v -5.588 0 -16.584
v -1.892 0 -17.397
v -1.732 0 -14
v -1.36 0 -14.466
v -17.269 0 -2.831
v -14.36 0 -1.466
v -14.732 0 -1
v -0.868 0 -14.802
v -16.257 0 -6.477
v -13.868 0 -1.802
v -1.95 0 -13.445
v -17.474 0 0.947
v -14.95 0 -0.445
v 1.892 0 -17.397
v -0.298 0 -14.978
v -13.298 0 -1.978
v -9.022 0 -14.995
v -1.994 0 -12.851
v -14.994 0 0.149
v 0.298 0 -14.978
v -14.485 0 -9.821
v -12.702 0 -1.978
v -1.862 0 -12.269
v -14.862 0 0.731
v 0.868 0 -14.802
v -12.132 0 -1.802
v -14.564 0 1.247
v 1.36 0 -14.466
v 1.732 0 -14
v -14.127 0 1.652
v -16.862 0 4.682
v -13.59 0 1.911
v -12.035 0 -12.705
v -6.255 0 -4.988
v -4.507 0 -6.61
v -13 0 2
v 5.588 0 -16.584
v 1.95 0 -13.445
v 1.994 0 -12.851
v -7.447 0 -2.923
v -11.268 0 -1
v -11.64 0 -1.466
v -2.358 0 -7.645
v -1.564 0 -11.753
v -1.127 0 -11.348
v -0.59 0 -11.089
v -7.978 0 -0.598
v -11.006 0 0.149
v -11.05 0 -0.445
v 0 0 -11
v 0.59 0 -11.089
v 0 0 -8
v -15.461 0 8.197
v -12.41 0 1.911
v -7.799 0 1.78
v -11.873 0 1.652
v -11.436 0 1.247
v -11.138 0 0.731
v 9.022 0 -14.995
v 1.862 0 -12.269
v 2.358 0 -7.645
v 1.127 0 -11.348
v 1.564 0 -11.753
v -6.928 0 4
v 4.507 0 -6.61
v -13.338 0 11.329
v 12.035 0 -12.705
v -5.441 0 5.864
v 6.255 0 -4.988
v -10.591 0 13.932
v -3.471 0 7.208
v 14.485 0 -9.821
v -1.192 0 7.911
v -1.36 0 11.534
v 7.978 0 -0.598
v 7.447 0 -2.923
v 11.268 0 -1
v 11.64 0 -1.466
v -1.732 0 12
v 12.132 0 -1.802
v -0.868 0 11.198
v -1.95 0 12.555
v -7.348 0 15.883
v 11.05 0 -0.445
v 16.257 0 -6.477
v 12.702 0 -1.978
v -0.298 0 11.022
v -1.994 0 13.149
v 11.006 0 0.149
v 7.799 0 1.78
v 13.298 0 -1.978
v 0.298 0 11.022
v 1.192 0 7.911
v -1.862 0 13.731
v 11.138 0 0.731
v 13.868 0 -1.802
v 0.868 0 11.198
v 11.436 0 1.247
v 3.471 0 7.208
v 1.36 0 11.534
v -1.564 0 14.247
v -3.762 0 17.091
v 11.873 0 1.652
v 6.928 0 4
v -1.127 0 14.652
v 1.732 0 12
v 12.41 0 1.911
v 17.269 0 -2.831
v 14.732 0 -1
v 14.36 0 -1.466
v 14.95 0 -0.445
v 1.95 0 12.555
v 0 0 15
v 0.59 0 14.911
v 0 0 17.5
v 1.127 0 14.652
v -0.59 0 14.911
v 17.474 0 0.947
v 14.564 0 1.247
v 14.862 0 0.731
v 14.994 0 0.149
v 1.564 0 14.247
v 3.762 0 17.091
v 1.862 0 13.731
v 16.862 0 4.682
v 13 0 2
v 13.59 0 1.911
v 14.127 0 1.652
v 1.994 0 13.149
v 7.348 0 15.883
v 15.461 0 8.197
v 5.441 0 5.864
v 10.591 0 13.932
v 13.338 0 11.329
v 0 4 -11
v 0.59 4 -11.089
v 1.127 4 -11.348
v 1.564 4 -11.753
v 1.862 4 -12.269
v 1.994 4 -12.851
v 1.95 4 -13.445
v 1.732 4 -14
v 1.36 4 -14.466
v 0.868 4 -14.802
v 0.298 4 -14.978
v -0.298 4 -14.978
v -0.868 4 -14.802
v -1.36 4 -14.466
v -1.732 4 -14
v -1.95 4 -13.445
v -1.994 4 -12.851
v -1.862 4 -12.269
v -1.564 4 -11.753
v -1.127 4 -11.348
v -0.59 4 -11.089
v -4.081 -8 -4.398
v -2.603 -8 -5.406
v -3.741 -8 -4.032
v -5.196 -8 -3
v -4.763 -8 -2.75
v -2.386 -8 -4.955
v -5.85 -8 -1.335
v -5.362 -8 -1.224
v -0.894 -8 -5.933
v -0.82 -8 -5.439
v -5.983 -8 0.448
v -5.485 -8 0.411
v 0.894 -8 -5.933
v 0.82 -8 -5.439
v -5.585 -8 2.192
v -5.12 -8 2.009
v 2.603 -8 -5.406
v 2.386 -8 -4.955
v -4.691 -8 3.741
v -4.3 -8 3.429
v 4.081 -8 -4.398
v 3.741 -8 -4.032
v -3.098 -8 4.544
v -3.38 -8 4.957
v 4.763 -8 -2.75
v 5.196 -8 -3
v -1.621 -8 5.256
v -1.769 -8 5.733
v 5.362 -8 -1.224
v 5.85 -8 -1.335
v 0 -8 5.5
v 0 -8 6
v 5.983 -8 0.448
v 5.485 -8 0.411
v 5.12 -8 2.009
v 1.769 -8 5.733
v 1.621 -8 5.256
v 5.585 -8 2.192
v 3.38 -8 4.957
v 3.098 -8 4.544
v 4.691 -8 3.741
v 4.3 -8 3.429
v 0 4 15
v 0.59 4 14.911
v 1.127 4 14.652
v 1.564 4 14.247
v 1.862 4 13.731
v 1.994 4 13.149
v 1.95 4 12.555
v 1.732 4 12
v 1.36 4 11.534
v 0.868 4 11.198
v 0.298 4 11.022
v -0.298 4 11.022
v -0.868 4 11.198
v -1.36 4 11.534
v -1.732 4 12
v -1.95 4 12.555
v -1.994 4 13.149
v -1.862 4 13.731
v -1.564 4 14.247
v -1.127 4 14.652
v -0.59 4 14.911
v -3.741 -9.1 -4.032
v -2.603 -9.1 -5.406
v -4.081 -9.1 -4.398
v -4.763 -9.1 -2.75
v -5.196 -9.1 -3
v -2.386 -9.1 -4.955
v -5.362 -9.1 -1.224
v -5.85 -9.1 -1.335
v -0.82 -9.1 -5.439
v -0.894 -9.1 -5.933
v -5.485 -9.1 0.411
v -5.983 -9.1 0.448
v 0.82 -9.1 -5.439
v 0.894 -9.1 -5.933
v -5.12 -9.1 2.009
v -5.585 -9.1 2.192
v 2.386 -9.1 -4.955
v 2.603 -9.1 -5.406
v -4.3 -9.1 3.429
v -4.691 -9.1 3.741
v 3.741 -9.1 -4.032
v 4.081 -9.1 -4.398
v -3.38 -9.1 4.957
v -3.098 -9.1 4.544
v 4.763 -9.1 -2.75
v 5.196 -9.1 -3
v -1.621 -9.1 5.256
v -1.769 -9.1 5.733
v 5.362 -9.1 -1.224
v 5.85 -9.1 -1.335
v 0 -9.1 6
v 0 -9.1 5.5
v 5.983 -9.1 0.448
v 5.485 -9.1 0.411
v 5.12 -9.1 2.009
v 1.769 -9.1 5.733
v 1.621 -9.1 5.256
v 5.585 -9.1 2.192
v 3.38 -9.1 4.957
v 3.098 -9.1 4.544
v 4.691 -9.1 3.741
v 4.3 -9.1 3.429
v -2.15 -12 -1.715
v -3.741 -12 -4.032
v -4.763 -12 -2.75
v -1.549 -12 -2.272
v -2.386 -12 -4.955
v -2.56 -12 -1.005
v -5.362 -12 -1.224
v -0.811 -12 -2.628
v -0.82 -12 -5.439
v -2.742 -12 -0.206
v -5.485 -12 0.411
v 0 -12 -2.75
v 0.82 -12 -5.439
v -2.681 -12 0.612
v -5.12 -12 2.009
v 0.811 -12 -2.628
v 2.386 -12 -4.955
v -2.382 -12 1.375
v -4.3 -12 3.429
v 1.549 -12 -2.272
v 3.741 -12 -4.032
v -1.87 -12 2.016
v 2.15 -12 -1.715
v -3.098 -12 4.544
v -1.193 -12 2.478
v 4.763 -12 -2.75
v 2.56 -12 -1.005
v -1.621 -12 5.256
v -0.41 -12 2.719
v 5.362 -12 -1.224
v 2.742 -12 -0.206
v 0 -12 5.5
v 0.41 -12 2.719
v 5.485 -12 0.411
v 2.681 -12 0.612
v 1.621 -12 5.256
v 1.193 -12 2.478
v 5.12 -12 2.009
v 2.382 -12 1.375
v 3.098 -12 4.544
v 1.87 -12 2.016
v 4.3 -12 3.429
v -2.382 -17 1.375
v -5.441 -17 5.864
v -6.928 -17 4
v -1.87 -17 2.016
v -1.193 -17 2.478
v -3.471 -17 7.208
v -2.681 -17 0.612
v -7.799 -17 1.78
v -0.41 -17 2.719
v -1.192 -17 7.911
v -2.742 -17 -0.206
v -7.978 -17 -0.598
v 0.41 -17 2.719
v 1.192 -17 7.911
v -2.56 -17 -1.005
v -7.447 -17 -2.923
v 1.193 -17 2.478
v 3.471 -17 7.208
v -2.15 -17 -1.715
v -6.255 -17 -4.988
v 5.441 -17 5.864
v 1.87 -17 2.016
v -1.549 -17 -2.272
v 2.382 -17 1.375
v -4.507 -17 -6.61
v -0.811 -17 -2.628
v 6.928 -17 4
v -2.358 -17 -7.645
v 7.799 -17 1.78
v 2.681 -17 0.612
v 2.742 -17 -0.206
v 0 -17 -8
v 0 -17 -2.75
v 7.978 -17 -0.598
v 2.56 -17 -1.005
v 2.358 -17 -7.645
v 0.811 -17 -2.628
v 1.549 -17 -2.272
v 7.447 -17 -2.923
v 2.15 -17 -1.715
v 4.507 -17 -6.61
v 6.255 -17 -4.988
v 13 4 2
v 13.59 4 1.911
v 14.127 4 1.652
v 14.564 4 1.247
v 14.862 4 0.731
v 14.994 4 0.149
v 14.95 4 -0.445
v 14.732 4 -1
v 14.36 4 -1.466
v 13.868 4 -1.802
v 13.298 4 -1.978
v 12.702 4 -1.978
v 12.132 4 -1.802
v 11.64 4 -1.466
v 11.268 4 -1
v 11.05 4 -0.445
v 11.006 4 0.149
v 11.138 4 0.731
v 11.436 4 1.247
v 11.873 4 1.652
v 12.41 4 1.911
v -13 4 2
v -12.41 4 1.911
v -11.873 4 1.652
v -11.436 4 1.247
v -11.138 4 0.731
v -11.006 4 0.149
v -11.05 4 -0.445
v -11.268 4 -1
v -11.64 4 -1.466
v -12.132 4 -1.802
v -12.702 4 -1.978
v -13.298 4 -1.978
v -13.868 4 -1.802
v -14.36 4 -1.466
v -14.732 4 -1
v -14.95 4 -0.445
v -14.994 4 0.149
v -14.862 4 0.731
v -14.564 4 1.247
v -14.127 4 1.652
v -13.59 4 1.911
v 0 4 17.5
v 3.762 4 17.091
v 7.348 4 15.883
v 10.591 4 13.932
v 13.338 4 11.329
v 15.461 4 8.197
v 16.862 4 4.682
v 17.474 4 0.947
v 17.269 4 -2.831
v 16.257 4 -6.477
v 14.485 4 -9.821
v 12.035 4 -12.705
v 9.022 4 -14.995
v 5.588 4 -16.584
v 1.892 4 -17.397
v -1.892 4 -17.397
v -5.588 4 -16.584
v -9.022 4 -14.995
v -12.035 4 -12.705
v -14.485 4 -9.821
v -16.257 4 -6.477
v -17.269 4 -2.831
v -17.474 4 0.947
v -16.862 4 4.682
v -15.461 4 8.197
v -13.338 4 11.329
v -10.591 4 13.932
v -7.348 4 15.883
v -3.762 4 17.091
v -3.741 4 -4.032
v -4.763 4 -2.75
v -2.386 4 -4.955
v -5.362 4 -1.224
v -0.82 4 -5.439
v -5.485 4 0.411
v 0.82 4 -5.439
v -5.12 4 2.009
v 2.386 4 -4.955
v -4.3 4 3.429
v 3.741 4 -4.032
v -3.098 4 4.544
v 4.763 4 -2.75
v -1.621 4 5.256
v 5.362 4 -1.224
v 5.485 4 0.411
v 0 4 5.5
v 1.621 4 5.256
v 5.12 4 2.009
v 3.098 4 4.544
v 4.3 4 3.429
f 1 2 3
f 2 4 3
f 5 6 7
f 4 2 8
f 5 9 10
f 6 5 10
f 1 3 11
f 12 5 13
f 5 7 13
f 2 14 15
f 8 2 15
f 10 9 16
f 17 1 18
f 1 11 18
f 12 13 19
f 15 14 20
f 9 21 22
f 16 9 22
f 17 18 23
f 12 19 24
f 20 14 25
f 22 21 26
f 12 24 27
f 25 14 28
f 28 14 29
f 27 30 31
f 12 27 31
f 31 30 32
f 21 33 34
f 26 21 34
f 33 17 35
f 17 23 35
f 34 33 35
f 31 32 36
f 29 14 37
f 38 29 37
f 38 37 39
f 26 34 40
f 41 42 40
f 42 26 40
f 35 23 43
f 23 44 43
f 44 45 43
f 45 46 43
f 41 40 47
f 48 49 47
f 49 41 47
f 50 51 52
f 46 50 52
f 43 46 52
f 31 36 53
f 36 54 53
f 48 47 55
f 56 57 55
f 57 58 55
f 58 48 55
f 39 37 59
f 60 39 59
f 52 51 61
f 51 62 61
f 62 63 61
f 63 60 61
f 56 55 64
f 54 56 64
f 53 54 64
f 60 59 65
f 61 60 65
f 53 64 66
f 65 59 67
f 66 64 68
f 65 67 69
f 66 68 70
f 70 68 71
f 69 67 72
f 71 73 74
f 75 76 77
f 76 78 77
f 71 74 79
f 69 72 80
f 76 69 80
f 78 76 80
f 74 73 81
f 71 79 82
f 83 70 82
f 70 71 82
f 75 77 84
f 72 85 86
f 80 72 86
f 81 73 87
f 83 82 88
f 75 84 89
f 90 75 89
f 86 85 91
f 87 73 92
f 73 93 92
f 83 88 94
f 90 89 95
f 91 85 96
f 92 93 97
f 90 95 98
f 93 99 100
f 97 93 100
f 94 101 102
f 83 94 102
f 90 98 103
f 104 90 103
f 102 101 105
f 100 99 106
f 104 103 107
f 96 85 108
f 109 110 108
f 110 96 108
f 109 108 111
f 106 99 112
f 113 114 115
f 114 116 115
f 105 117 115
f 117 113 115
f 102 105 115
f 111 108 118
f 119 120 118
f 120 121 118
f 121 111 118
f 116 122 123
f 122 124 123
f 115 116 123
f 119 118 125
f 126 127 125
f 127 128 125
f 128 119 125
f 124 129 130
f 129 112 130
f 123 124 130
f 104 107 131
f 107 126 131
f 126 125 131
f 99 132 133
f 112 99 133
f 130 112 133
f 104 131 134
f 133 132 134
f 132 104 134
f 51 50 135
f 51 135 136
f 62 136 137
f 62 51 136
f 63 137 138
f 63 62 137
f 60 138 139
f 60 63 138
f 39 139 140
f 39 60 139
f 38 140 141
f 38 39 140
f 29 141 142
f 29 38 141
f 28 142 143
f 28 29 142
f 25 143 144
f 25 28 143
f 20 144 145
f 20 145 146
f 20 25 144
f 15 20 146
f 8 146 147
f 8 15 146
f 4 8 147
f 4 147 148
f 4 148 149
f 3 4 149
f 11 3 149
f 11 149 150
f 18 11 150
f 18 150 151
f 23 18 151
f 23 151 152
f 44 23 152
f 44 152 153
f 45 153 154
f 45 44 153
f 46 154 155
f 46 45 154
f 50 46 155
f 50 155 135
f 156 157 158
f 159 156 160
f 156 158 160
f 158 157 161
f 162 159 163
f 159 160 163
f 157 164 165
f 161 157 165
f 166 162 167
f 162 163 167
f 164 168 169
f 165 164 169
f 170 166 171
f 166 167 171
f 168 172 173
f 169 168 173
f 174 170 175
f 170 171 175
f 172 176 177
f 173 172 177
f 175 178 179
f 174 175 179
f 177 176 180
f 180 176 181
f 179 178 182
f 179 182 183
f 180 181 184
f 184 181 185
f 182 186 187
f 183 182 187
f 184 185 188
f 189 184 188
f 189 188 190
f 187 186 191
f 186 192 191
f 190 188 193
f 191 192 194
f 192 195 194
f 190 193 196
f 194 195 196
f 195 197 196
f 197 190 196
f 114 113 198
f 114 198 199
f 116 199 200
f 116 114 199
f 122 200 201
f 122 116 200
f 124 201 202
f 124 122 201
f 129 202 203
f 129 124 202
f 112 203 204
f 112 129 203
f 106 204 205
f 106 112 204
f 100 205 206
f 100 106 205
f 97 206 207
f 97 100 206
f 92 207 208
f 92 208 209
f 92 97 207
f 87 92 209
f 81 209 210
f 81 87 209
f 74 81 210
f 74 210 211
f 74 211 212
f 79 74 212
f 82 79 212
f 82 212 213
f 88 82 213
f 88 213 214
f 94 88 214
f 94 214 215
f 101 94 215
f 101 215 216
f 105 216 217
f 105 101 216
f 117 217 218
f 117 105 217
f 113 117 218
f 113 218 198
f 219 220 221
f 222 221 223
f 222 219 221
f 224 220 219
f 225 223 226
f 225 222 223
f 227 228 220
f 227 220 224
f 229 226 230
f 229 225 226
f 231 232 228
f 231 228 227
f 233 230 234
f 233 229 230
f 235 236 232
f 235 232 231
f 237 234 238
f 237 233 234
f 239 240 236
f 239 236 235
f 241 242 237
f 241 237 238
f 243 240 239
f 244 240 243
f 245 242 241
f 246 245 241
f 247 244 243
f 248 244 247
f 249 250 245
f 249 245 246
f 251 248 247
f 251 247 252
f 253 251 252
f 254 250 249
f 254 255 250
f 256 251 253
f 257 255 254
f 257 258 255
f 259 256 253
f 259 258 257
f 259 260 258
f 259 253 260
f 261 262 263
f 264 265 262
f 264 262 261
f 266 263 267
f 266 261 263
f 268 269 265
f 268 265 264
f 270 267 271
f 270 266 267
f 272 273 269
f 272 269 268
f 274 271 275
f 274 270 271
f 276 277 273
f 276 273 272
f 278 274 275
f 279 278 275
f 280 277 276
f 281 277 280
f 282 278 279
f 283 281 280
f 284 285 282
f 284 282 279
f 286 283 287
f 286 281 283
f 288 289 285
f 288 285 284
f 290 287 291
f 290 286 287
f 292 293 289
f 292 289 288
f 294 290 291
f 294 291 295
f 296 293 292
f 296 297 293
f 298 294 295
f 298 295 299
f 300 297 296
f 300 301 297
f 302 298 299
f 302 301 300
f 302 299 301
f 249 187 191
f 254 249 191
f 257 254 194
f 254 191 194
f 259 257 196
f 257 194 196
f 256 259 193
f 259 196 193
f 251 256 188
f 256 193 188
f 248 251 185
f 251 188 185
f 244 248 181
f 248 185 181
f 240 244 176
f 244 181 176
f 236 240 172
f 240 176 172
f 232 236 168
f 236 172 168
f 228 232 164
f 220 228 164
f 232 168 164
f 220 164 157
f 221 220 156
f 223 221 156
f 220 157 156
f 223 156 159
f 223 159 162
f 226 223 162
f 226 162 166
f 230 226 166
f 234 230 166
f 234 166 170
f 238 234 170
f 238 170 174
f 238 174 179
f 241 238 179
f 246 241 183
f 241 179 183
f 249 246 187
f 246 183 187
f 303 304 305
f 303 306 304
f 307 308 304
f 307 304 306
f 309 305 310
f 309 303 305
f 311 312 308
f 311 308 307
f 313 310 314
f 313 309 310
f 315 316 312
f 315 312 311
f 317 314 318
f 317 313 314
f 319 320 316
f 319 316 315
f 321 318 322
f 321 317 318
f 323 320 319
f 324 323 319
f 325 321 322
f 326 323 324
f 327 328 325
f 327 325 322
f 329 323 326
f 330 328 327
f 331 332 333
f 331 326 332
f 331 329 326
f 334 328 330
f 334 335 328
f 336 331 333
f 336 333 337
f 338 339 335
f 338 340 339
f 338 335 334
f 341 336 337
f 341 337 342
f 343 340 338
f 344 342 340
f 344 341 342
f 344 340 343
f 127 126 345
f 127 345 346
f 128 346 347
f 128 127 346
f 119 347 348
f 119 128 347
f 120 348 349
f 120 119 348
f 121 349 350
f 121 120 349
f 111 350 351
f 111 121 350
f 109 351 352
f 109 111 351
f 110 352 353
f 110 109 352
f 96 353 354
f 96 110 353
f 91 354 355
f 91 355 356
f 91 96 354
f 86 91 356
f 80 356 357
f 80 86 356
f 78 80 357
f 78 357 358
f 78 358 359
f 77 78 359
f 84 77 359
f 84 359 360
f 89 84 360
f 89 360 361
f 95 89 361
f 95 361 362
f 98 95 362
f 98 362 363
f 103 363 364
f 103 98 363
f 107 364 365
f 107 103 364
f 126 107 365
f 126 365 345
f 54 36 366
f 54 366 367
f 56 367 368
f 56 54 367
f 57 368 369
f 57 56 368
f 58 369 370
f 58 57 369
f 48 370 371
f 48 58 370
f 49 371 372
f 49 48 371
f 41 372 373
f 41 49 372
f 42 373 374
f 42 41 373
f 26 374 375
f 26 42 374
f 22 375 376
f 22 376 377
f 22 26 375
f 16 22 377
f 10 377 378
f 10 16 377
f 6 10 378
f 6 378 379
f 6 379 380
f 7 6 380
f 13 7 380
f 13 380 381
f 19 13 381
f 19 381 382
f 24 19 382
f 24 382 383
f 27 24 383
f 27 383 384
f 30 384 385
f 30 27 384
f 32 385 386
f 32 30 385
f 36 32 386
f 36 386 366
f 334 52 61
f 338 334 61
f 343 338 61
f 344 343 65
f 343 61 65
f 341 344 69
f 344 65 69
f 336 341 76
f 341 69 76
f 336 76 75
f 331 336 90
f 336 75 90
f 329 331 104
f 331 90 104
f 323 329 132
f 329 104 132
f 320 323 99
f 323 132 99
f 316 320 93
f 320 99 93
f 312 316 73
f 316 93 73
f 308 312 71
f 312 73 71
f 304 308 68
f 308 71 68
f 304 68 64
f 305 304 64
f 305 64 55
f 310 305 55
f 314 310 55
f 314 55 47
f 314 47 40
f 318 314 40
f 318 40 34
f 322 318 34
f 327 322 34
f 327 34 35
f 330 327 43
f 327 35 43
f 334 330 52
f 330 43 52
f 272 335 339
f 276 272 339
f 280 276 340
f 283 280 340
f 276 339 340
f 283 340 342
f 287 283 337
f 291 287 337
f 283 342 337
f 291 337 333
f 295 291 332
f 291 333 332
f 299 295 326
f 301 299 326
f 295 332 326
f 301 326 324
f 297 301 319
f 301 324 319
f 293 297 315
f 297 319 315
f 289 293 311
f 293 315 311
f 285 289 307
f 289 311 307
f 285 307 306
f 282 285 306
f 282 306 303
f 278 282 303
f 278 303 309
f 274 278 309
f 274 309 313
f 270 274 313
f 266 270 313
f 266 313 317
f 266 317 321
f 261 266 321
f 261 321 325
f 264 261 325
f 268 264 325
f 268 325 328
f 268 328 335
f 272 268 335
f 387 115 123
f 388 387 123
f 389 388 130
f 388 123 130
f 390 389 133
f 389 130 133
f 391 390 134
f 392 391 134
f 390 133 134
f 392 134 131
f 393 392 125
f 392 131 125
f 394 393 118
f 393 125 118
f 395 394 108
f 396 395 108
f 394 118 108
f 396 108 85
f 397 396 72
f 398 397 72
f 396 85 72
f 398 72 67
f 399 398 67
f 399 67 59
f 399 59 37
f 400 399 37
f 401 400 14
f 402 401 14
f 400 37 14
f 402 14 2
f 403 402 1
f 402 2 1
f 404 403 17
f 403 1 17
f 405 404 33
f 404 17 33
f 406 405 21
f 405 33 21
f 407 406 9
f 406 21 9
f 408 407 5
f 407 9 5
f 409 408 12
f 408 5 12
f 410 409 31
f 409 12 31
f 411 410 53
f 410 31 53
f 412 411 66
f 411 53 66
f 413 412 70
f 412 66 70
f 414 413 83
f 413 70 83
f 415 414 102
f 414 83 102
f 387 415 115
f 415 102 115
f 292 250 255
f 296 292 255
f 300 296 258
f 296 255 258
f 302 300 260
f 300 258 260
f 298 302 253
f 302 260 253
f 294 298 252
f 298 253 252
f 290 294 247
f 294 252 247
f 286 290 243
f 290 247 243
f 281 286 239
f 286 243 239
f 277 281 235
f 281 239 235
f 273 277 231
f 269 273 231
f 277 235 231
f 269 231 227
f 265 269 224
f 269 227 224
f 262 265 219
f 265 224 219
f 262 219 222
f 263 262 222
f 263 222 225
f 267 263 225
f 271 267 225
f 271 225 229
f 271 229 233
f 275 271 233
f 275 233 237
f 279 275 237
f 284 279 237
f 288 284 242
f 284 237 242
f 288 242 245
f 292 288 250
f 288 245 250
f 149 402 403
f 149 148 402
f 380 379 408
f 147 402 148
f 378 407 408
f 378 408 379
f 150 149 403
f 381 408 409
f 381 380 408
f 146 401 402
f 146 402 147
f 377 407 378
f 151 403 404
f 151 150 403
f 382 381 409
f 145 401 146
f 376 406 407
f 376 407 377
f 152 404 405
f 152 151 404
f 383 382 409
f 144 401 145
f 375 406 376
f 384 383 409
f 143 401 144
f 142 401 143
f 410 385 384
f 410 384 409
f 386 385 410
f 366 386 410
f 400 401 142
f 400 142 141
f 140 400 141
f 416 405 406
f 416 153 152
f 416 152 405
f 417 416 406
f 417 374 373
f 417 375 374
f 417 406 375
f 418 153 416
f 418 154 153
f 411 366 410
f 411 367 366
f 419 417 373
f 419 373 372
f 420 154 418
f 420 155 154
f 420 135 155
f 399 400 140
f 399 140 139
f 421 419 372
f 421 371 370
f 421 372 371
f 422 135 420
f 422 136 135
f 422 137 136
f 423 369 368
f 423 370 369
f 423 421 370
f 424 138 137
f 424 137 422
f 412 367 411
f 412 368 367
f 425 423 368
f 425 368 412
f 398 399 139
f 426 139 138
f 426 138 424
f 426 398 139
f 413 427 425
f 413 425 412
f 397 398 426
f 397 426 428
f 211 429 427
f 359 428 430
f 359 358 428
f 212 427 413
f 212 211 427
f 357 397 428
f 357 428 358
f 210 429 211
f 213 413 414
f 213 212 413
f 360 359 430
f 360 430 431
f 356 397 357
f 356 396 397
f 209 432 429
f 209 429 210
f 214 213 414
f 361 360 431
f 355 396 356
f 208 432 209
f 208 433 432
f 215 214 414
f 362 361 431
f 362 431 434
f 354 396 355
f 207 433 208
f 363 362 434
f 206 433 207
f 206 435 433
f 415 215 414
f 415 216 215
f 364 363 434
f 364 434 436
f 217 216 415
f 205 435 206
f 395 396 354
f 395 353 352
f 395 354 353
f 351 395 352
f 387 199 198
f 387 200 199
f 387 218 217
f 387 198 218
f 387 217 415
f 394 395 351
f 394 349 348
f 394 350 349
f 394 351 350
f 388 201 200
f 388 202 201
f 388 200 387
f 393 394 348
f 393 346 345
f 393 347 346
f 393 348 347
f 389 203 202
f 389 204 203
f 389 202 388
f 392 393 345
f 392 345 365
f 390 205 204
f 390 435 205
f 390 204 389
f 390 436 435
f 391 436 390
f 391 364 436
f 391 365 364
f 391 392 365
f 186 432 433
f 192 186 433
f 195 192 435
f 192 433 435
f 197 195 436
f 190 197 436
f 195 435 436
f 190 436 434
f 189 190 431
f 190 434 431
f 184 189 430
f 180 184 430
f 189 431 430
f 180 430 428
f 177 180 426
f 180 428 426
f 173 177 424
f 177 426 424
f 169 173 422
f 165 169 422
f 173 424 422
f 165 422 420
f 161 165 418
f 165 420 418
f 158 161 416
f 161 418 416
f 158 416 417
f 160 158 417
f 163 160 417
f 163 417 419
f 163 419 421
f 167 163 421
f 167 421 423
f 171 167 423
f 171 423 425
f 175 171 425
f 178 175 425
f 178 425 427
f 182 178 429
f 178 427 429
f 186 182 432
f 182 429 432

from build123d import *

# Parameters (mm, degrees)
SKETCH1_R           = 17.5
SKETCH1_R_2         = 2
BOSS_EXTRUDE1_DEPTH = 4
SKETCH2_R           = 8
BOSS_EXTRUDE2_DEPTH = 17
SKETCH3_R           = 5.5
CUT_EXTRUDE1_DEPTH  = 12
SKETCH4_R           = 6
CUT_EXTRUDE2_DEPTH  = 1.1
SKETCH5_R           = 5.5
CUT_EXTRUDE3_DEPTH  = 2.9
SKETCH6_R           = 2.75
CUT_EXTRUDE4_DEPTH  = 5.5


with BuildPart() as part:
    # Sketch1 → Boss-Extrude1 (new body)
    with BuildSketch(Plane(origin=(0, 0, 0), x_dir=(1, 0, 0), z_dir=(0, 1, 0))):
        with Locations(Location((0, 0, 0), (0, 0, 270))):
            Circle(SKETCH1_R)
        with Locations(Location((0, 13, 0), (0, 0, 270))):
            Circle(SKETCH1_R_2, mode=Mode.SUBTRACT)
        with Locations(Location((13, 0, 0), (0, 0, 270))):
            Circle(SKETCH1_R_2, mode=Mode.SUBTRACT)
        with Locations(Location((0, -13, 0), (0, 0, 270))):
            Circle(SKETCH1_R_2, mode=Mode.SUBTRACT)
        with Locations(Location((-13, 0, 0), (0, 0, 270))):
            Circle(SKETCH1_R_2, mode=Mode.SUBTRACT)
    extrude(amount=BOSS_EXTRUDE1_DEPTH)

    # Sketch2 → Boss-Extrude2 (add)
    with BuildSketch(Plane.XZ):
        with Locations(Location((0, 0, 0), (0, 0, 270))):
            Circle(SKETCH2_R)
    extrude(amount=BOSS_EXTRUDE2_DEPTH)

    # Sketch3 → Cut-Extrude1 (cut)
    with BuildSketch(Plane(origin=(0, 4, 0), x_dir=(1, 0, 0), z_dir=(0, 1, 0))):
        with Locations(Location((0, 0, 0), (0, 0, 270))):
            Circle(SKETCH3_R)
    extrude(amount=-CUT_EXTRUDE1_DEPTH, mode=Mode.SUBTRACT)

    # Sketch4 → Cut-Extrude2 (cut)
    with BuildSketch(Plane(origin=(0, -8, 0), x_dir=(1, 0, 0), z_dir=(0, 1, 0))):
        with Locations(Location((0, 0, 0), (0, 0, 270))):
            Circle(SKETCH4_R)
    extrude(amount=-CUT_EXTRUDE2_DEPTH, mode=Mode.SUBTRACT)

    # Sketch5 → Cut-Extrude3 (cut)
    with BuildSketch(Plane(origin=(0, -9.1, 0), x_dir=(1, 0, 0), z_dir=(0, 1, 0))):
        with Locations(Location((0, 0, 0), (0, 0, 270))):
            Circle(SKETCH5_R)
    extrude(amount=-CUT_EXTRUDE3_DEPTH, mode=Mode.SUBTRACT)

    # Sketch6 → Cut-Extrude4 (cut)
    with BuildSketch(Plane.XZ.offset(17)):
        with Locations(Location((0, 0, 0), (0, 0, 270))):
            Circle(SKETCH6_R)
    extrude(amount=-CUT_EXTRUDE4_DEPTH, mode=Mode.SUBTRACT)


solid = part.part
